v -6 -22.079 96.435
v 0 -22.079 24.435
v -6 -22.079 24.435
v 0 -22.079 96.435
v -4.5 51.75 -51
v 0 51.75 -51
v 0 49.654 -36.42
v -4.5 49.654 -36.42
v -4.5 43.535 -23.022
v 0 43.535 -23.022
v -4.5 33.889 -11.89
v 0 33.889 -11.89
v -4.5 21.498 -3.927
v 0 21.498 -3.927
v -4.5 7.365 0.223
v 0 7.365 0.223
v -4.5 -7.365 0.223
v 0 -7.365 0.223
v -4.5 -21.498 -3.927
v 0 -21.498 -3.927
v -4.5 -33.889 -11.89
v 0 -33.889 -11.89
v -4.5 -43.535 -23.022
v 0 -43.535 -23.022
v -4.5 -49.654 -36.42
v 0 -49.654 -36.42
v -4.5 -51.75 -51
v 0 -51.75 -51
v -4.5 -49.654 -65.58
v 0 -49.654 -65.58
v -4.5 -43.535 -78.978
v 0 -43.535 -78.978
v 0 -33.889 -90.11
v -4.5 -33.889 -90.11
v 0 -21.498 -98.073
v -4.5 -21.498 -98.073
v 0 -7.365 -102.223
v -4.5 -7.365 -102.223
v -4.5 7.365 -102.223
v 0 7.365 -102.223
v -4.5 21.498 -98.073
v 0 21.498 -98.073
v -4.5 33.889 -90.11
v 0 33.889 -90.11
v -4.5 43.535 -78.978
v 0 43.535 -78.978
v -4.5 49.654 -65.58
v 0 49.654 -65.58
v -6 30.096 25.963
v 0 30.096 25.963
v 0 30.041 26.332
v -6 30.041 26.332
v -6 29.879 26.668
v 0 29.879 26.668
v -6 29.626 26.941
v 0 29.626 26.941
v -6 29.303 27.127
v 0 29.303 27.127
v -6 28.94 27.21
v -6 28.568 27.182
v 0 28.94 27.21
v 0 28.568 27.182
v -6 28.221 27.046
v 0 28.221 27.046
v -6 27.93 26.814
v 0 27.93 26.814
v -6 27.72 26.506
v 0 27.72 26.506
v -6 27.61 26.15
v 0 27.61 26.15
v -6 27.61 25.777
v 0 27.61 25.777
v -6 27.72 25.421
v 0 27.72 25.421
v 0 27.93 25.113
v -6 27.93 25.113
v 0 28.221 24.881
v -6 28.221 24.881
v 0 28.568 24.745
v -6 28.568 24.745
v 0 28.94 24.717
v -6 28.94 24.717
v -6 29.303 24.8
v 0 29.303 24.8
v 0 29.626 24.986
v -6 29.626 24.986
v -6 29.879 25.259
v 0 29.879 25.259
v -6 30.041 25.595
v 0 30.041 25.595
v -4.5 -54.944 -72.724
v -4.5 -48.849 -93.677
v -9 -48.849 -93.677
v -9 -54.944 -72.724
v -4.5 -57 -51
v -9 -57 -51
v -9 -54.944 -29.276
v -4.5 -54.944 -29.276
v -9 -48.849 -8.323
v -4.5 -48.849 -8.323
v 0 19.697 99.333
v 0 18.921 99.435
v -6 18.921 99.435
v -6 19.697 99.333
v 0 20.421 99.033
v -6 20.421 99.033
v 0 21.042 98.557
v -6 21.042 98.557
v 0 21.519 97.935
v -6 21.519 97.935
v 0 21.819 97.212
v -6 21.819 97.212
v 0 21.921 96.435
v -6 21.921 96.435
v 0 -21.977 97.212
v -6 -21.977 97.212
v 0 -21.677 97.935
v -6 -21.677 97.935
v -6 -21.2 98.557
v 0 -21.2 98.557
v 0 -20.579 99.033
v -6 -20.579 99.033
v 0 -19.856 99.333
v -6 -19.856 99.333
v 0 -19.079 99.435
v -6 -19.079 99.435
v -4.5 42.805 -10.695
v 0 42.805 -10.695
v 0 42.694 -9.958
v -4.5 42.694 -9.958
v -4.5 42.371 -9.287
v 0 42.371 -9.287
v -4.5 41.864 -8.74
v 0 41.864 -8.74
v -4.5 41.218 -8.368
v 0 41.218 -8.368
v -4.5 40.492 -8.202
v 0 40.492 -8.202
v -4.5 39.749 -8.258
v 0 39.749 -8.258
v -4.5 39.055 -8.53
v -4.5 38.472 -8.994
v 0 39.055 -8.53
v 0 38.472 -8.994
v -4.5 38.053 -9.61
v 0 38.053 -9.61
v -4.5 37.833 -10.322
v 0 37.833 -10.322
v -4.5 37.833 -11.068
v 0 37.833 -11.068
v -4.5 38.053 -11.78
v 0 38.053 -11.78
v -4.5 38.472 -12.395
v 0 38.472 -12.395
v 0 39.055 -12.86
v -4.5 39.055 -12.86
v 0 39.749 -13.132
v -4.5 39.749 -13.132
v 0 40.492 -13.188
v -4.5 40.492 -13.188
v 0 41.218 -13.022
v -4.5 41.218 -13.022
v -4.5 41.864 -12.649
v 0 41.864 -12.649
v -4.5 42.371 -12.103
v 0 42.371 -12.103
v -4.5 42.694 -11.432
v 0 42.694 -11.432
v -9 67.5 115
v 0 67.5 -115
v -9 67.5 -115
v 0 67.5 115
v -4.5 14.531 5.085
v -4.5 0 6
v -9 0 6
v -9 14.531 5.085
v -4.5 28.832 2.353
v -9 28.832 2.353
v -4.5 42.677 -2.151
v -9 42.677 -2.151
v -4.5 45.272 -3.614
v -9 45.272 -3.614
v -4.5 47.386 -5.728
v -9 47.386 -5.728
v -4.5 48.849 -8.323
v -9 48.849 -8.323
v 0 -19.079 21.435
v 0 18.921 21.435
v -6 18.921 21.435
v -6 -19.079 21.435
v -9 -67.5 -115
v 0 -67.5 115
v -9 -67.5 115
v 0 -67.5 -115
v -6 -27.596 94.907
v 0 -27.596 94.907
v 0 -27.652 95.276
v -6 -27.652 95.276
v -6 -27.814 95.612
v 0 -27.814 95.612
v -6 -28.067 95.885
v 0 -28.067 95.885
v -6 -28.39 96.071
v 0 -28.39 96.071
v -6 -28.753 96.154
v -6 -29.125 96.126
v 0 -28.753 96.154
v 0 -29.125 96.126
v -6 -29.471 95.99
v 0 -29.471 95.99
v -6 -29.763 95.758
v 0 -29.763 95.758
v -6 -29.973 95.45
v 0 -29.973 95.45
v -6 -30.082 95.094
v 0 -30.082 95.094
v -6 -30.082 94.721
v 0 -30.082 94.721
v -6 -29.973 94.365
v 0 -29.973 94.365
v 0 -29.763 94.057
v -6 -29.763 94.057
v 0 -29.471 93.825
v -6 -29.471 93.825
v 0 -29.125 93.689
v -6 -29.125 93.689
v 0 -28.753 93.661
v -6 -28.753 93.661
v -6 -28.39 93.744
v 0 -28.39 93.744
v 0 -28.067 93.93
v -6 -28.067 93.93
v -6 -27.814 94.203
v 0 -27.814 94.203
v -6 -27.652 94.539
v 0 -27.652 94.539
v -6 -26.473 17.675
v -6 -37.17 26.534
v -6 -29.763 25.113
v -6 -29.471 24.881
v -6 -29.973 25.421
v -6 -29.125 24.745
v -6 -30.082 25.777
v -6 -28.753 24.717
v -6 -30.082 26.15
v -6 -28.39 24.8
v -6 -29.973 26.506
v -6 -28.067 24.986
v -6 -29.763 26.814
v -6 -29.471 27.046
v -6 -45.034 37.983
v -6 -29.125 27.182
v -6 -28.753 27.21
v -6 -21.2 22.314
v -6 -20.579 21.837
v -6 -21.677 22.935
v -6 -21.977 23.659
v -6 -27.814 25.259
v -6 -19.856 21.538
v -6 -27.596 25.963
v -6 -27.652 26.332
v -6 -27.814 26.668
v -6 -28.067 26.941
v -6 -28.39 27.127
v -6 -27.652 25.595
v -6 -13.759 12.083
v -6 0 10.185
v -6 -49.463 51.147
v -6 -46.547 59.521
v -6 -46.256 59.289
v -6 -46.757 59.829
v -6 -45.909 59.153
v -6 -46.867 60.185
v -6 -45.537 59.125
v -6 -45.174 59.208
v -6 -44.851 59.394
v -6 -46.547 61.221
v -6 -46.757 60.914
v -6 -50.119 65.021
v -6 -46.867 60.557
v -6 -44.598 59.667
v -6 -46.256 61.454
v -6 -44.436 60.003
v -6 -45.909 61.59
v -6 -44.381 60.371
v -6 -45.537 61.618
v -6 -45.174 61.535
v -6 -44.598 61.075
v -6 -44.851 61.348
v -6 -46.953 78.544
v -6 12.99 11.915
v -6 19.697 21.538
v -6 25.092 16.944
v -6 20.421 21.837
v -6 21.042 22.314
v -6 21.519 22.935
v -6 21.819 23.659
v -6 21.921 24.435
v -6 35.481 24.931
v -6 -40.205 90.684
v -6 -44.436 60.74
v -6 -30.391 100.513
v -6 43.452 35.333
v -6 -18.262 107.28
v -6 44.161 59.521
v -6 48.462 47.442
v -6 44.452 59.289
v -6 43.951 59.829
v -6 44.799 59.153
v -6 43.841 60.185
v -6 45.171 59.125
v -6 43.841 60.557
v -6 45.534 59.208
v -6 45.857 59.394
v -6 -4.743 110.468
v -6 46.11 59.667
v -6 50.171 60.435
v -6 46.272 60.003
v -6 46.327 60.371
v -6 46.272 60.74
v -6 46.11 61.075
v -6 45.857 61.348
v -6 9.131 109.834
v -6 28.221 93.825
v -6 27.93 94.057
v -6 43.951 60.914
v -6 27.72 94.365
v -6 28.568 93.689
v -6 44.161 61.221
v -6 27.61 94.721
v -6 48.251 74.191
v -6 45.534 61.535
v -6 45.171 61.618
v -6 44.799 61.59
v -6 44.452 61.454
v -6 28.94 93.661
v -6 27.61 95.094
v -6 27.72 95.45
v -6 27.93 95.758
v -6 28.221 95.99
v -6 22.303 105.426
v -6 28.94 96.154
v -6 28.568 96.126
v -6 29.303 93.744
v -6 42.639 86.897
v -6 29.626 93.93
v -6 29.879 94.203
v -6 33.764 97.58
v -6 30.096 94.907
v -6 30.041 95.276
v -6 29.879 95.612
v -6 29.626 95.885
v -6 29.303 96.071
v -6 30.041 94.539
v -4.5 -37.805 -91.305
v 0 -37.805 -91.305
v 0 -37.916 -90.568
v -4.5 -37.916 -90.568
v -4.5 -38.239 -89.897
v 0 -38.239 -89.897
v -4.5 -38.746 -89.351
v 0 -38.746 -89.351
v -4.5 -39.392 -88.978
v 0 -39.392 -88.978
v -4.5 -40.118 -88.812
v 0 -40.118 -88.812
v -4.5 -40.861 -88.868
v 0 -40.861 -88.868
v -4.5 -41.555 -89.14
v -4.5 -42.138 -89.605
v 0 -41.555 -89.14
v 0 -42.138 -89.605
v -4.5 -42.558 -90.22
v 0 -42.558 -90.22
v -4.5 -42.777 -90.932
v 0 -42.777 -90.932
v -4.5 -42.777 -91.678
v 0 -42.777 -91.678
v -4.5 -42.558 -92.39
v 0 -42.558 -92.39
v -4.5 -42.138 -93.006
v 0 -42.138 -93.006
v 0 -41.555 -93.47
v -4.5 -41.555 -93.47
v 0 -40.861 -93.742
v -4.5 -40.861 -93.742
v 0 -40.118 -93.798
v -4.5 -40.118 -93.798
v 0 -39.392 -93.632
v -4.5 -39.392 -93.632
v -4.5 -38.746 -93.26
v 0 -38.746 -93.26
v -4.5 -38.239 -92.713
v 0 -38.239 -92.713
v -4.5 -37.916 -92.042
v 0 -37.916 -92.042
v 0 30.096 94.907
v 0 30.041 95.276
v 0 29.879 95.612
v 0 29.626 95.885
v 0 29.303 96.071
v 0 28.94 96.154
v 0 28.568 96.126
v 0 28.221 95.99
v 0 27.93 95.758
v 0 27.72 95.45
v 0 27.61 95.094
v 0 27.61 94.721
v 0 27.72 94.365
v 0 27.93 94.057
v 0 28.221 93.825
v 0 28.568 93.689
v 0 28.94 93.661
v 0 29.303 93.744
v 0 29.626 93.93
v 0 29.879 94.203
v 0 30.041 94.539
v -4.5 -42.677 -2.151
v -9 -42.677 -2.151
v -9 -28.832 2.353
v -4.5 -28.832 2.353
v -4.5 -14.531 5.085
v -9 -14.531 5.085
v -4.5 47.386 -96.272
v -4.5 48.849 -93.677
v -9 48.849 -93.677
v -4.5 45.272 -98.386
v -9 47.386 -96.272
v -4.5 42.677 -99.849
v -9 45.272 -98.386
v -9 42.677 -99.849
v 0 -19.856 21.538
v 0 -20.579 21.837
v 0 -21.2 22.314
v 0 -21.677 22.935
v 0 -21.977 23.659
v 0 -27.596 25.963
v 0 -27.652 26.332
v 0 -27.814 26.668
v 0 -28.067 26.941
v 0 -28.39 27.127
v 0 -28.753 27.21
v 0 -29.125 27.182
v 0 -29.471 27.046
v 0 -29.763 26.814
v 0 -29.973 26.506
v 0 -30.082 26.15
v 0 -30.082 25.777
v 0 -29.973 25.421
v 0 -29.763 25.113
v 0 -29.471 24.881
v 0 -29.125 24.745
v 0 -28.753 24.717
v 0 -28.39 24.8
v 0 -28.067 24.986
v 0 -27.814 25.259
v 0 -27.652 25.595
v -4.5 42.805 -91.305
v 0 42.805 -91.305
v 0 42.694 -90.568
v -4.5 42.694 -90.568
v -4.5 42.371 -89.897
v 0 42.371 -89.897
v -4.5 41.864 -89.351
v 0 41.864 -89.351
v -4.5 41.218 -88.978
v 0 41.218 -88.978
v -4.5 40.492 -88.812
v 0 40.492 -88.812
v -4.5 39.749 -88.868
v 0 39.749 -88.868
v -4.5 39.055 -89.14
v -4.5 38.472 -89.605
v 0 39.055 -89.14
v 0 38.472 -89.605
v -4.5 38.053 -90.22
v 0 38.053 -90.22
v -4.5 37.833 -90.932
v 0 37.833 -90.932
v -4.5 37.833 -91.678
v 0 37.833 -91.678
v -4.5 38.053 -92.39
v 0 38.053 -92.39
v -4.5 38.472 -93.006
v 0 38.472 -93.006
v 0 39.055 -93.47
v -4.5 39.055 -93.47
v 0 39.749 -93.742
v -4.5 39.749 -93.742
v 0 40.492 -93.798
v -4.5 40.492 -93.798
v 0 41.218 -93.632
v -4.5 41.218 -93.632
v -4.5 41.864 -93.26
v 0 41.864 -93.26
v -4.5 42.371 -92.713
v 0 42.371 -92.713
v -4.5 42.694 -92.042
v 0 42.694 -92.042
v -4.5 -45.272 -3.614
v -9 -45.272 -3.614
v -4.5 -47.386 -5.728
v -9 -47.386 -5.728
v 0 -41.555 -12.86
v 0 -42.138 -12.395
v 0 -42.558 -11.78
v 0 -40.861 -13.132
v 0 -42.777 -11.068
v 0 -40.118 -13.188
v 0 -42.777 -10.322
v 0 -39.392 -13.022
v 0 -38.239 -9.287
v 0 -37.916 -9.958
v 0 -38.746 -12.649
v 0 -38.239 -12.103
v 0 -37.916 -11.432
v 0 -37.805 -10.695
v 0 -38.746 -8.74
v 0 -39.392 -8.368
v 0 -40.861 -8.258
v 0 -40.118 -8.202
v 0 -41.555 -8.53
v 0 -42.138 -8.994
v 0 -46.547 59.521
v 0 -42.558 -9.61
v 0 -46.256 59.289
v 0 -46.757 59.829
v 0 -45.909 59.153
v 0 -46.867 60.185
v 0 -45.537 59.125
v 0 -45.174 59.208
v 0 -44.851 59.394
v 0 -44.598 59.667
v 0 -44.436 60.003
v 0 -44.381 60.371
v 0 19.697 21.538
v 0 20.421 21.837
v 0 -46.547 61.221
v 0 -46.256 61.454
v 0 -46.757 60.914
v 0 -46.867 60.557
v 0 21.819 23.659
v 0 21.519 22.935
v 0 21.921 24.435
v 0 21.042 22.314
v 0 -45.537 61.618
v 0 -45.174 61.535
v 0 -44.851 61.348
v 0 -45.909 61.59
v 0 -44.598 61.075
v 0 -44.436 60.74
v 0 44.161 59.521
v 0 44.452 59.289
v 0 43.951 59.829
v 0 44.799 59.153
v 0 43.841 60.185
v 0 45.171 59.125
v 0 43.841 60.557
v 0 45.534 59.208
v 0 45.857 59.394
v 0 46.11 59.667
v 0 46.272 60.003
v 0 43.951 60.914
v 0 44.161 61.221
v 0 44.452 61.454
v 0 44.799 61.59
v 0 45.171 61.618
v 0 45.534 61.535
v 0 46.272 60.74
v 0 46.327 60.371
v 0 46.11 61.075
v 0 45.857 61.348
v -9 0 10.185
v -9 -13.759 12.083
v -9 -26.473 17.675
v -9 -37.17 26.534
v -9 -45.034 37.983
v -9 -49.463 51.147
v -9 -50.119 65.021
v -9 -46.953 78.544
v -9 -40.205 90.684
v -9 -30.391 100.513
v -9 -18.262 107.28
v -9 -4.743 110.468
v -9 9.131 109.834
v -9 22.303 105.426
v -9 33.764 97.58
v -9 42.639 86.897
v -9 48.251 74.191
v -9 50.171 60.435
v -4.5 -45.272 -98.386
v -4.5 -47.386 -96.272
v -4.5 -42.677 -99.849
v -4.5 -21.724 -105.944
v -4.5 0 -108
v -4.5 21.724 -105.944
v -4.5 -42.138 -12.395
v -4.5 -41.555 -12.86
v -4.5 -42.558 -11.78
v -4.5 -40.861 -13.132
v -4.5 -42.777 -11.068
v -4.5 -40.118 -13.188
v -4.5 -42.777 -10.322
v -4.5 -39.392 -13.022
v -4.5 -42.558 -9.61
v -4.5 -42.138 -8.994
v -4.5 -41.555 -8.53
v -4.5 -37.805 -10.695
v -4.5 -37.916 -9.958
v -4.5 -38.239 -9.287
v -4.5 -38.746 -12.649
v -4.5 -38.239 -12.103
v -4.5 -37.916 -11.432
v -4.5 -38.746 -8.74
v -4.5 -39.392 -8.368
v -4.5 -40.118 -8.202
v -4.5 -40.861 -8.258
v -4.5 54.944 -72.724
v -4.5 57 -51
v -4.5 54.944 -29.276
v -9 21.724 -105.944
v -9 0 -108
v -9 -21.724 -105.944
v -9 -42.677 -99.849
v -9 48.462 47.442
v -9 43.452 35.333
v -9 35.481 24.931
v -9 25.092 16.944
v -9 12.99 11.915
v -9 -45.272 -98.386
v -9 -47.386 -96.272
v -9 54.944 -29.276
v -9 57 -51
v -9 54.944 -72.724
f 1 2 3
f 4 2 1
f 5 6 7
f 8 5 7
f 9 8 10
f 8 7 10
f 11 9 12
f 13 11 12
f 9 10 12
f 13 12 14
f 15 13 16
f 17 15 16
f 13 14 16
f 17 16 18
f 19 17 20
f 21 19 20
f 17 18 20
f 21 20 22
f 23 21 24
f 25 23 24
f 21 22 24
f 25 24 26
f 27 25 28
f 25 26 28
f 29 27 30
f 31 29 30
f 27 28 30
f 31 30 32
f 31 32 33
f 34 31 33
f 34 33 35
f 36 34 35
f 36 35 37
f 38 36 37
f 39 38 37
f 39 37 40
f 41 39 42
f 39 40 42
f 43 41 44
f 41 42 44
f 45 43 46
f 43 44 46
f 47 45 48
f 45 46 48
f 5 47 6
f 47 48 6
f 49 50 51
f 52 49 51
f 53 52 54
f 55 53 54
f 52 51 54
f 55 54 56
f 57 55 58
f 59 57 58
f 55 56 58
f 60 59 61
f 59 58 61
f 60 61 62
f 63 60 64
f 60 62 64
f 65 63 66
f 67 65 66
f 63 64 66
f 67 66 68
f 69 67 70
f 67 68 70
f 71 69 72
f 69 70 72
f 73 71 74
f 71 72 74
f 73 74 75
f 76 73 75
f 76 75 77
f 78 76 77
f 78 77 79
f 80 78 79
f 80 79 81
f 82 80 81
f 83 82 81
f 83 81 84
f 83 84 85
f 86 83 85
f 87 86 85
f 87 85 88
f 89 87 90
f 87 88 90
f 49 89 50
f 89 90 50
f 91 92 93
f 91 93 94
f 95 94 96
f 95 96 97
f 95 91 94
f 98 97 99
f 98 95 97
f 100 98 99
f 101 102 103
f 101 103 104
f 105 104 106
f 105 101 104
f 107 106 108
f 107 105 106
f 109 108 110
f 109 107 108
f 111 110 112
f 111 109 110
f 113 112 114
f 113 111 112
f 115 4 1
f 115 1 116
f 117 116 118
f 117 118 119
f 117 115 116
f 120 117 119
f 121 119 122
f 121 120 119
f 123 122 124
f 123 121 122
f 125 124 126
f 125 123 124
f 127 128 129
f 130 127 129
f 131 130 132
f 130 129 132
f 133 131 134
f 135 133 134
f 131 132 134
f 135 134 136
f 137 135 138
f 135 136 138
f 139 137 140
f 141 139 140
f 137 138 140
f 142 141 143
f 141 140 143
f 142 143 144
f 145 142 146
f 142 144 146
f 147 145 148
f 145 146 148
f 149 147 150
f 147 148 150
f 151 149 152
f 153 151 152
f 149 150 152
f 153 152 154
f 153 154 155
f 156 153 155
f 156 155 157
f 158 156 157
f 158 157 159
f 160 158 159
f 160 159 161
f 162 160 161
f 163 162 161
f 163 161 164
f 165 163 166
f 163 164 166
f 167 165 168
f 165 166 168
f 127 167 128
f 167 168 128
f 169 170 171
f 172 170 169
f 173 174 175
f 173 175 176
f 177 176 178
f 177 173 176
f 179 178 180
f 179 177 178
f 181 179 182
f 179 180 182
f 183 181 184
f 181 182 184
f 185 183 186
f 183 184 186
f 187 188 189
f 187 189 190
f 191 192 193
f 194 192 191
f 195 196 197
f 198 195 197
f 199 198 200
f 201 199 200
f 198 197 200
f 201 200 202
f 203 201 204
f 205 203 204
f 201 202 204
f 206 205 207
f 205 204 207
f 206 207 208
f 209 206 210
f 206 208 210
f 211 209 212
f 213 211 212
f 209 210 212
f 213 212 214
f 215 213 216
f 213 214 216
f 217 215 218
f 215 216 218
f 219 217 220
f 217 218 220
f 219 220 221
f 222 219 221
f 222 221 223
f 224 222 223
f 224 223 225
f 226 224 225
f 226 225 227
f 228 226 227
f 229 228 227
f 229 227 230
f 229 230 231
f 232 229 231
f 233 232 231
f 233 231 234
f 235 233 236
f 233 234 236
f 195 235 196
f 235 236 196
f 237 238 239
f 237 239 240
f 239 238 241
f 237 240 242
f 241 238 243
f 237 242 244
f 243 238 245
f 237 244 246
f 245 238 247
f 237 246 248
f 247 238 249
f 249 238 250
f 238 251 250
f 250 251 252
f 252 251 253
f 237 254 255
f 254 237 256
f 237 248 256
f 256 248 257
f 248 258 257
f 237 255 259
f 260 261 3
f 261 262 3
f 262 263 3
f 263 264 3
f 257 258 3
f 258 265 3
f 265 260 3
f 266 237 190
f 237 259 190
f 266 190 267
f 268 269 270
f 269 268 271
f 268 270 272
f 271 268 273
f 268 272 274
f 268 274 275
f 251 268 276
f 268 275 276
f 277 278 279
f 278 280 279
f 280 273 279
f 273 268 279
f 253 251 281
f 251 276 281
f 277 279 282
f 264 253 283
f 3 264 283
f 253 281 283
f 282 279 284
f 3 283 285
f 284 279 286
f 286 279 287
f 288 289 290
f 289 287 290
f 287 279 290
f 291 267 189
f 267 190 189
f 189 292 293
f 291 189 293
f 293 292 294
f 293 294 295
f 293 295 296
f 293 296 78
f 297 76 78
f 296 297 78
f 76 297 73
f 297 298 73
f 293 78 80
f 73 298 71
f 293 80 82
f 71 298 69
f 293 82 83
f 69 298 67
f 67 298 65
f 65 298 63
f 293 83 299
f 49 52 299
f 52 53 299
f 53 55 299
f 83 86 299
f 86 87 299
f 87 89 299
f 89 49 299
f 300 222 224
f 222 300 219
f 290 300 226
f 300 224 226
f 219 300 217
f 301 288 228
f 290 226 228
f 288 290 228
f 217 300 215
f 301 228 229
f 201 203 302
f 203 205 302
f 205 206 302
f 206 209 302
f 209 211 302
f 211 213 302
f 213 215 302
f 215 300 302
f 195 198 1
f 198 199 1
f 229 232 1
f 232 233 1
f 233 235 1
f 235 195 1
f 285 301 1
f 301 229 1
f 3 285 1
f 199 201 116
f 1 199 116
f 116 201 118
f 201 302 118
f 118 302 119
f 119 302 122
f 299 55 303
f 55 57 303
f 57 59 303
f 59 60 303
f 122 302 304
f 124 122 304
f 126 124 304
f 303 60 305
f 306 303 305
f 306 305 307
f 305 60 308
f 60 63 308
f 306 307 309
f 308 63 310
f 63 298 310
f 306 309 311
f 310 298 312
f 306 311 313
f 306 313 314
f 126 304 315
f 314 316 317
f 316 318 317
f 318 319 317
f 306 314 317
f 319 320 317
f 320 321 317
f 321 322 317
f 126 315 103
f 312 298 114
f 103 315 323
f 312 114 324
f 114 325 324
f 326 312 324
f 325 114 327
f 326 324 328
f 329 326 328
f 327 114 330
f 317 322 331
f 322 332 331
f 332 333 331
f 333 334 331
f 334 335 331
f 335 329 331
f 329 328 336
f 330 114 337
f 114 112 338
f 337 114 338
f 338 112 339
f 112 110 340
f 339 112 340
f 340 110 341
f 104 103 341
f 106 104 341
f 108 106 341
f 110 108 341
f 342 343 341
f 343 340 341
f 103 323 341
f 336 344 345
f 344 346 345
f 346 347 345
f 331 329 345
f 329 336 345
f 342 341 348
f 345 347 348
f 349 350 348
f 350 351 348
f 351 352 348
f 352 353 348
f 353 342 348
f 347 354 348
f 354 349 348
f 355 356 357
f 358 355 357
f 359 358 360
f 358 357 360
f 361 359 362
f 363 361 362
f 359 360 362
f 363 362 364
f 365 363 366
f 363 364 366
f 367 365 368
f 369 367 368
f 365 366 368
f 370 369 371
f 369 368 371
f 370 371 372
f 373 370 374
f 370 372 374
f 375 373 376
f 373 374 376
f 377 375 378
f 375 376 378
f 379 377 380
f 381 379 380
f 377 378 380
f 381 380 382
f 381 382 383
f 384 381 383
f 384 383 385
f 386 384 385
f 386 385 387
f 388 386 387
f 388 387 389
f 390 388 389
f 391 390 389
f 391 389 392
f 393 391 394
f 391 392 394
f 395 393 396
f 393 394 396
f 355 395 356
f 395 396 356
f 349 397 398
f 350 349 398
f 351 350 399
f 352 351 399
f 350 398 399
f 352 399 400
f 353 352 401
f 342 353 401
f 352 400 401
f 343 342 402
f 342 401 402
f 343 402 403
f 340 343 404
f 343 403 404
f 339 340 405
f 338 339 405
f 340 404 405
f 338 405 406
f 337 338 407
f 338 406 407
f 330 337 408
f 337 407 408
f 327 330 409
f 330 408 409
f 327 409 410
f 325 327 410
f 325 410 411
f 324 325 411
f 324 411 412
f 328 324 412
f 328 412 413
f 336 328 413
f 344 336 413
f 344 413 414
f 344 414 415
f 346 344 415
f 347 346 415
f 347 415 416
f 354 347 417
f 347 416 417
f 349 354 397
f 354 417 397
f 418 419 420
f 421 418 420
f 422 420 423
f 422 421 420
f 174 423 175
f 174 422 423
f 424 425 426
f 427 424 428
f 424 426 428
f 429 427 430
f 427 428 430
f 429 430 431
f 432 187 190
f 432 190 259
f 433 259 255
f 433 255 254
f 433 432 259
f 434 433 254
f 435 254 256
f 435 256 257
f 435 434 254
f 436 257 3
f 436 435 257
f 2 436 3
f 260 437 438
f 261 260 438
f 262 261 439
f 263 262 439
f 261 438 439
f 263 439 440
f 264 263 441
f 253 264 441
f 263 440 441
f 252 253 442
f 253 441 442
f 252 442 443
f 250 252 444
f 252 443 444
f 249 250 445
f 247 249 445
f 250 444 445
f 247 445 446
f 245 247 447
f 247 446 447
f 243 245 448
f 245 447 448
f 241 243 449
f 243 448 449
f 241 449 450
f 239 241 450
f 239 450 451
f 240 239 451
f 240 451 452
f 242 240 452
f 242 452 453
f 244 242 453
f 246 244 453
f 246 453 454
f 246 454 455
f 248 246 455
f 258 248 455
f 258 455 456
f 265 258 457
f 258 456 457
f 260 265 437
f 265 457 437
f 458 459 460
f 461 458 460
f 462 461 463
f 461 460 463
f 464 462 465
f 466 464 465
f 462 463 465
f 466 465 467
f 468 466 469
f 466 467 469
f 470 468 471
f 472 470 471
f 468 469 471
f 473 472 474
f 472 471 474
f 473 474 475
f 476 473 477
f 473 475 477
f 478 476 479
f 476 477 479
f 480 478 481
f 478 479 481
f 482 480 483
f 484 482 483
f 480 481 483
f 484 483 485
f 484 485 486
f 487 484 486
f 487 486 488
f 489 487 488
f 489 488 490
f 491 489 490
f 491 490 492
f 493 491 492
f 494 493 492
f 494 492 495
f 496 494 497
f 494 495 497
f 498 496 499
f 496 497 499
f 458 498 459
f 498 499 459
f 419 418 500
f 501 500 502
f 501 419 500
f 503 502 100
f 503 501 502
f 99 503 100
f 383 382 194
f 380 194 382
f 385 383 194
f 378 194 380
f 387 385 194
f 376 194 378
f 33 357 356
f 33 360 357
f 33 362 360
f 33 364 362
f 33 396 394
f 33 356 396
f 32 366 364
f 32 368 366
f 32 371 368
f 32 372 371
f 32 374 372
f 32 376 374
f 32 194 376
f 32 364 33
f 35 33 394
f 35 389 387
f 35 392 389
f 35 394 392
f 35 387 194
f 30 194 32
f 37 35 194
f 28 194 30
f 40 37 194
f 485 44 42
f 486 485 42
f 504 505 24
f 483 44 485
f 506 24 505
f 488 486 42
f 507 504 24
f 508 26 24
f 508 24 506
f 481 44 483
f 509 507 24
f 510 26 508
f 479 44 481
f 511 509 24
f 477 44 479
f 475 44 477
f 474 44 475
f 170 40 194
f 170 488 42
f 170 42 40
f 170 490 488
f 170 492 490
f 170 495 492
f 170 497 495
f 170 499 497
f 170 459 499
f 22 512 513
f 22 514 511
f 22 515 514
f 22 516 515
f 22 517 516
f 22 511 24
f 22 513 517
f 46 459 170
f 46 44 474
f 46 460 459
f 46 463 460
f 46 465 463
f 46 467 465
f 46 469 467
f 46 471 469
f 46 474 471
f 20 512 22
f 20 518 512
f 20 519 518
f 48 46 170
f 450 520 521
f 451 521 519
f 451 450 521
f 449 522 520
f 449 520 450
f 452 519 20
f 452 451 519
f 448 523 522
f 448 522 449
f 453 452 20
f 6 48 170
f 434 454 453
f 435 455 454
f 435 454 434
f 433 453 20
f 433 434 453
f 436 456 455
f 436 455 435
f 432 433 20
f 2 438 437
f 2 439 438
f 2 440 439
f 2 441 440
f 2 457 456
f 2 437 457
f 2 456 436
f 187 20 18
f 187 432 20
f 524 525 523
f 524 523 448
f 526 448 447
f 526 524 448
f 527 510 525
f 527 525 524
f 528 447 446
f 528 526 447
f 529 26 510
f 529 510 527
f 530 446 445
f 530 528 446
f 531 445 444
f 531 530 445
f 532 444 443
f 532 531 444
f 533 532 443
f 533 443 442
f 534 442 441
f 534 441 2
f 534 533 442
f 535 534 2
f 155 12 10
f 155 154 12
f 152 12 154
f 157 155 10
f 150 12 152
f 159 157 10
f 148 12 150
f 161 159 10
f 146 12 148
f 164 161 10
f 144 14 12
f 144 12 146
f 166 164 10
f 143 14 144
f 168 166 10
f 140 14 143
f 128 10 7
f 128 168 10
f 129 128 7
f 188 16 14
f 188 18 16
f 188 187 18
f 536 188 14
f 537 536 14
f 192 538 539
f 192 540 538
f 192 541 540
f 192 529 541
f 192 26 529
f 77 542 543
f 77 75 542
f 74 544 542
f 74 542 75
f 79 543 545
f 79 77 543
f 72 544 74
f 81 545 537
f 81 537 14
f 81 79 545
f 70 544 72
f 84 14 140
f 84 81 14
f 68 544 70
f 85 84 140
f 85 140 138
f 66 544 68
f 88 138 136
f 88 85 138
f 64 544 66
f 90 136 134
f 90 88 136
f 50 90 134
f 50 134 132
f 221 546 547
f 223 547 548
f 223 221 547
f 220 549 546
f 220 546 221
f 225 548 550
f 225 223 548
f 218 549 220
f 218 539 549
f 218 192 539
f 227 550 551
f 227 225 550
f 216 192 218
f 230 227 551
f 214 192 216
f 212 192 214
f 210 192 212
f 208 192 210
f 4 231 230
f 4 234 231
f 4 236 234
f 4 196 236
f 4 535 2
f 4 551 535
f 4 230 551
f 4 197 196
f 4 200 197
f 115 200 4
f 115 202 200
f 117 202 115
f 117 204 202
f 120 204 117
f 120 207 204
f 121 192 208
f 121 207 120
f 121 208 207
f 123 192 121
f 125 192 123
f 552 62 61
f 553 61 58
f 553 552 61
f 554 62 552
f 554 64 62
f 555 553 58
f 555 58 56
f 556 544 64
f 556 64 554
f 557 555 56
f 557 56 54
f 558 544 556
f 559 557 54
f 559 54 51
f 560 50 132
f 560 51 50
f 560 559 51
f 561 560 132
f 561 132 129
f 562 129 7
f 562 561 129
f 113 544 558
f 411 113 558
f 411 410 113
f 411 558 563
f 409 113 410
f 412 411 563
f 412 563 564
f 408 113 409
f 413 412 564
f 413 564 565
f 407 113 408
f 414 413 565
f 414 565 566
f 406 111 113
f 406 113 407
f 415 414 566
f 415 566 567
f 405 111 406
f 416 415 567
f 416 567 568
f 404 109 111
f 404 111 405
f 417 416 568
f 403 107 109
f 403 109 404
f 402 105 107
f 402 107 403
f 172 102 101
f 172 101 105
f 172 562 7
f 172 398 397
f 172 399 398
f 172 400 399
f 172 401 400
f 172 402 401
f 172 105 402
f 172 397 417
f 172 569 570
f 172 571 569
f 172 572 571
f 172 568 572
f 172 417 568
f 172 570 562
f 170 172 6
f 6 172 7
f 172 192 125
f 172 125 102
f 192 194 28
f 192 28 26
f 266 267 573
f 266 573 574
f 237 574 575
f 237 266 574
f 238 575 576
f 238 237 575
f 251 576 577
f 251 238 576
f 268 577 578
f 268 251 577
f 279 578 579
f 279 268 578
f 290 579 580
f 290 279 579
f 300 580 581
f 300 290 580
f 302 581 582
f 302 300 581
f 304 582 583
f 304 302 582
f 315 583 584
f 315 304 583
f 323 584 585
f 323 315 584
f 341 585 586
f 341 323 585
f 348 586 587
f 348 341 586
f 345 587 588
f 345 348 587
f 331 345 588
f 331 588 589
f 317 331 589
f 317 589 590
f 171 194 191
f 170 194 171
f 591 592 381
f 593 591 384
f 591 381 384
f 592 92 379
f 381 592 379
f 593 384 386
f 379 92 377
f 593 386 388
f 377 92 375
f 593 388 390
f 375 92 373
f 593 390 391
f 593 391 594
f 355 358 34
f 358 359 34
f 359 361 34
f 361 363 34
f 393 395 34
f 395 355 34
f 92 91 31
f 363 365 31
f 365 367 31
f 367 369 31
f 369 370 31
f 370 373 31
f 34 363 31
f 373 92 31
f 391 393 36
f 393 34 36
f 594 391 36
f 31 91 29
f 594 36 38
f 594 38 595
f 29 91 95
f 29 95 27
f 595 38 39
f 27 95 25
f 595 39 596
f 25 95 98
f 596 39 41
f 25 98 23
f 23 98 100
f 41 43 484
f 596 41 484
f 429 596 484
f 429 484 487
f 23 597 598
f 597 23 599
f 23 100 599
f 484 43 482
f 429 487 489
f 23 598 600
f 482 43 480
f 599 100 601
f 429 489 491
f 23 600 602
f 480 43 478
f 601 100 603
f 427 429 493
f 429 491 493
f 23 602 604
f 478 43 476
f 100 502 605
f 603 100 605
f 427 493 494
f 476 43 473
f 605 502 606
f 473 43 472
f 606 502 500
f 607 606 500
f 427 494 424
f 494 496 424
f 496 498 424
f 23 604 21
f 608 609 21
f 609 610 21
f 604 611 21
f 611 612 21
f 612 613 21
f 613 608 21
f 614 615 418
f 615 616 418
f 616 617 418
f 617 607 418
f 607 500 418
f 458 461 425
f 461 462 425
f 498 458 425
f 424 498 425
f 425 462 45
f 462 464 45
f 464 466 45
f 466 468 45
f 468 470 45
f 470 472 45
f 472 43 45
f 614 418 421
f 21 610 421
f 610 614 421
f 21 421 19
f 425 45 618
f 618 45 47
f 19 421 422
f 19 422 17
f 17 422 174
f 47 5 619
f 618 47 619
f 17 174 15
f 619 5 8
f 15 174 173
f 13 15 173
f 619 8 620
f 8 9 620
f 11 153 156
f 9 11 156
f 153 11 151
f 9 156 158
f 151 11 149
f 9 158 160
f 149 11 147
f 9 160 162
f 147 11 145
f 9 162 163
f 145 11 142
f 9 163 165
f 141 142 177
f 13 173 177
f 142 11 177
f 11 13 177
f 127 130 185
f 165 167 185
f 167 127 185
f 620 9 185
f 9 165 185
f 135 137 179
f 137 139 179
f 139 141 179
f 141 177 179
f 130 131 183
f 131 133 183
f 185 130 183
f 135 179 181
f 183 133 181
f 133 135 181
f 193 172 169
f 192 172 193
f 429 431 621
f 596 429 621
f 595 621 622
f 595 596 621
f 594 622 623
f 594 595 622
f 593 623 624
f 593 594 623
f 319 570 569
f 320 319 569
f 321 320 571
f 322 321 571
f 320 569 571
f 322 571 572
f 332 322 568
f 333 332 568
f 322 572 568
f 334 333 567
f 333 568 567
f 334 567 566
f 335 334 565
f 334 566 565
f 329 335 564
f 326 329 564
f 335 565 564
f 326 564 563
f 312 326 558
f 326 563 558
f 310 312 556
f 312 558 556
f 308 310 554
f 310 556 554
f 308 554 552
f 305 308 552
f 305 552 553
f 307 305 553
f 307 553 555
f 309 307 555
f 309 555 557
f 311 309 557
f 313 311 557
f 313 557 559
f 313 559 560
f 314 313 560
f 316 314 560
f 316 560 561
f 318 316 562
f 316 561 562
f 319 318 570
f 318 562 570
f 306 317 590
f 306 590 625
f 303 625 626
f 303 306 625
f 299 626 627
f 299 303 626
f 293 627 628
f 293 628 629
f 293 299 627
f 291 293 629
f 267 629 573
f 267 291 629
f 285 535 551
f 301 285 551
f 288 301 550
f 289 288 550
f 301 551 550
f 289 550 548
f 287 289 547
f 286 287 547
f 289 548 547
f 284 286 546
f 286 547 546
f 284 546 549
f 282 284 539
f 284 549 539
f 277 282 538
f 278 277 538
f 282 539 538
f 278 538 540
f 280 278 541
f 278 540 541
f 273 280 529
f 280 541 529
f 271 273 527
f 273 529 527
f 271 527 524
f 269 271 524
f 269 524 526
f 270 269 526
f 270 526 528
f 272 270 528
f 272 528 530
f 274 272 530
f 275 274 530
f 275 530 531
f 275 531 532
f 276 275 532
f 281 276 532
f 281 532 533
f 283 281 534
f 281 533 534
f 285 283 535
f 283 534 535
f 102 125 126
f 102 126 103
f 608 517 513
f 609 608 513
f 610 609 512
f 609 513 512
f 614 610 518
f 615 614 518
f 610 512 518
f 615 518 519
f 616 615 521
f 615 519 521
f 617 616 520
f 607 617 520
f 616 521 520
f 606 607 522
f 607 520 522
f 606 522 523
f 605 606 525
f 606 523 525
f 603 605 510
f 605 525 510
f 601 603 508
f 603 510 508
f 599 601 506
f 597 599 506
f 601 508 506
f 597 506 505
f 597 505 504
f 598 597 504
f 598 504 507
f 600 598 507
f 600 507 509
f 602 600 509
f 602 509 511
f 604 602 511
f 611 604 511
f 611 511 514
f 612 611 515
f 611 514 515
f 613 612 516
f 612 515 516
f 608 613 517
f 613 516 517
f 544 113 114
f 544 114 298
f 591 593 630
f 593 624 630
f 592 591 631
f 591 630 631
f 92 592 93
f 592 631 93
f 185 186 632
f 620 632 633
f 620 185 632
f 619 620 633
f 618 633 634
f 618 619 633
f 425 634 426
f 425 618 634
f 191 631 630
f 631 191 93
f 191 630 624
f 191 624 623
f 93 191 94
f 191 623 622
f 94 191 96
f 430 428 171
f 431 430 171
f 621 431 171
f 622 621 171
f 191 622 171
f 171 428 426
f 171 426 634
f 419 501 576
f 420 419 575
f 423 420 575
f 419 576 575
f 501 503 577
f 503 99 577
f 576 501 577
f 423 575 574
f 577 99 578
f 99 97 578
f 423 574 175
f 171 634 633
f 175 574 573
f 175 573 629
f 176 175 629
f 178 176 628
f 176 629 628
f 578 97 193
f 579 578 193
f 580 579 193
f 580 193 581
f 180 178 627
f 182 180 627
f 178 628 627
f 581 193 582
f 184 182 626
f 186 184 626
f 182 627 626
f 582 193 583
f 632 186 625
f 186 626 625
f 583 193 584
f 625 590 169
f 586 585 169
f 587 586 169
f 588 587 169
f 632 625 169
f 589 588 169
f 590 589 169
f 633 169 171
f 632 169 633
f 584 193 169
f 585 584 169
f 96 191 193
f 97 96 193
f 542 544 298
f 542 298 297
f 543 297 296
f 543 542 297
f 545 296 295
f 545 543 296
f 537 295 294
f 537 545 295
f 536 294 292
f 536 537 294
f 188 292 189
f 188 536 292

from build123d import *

# Parameters (mm, degrees)
F1_DEPTH = 9
F0_R     = 2.5
F0_R_2   = 51.75
F2_DEPTH = 4.5
F3_R     = 11
F0_R_3   = 1.25
F4_DEPTH = 6


with BuildPart() as f1:
    # F0 (on Right) → F1 (new body)
    with BuildSketch(Plane.YZ):
        Polygon((67.5, -115), (67.5, 115), (0, 115), (-67.5, 115), (-67.5, -115), align=None)
        with BuildLine():
            ThreePointArc((-47.0226009489, -3.9773990511), (-24.0347326375, 3.4781900517), (0, 6))
            ThreePointArc((0, 6), (24.0347326375, 3.4781900517), (47.0226009489, -3.9773990511))
            ThreePointArc((47.0226009489, -3.9773990511), (57, -51), (47.0226009489, -98.0226009489))
            ThreePointArc((47.0226009489, -98.0226009489), (0, -108), (-47.0226009489, -98.0226009489))
            ThreePointArc((-47.0226009489, -98.0226009489), (-57, -51), (-47.0226009489, -3.9773990511))
        make_face(mode=Mode.SUBTRACT)
        with BuildLine():
            ThreePointArc((0, 10.1854634317), (-50.3290897047, 60.4354011911), (0, 110.6853389504))
            ThreePointArc((0, 110.6853389504), (35.4809774891, 95.9395435011), (50.1709102953, 60.4354011911))
            ThreePointArc((50.1709102953, 60.4354011911), (35.4809774891, 24.9312588811), (0, 10.1854634317))
        make_face(mode=Mode.SUBTRACT)
    extrude(amount=-F1_DEPTH)

    # F0 (on Right) → F2 (join)
    with BuildSketch(Plane.YZ):
        with BuildLine():
            ThreePointArc((47.0226009489, -3.9773990511), (24.0347326375, 3.4781900517), (0, 6))
            ThreePointArc((0, 6), (-24.0347326375, 3.4781900517), (-47.0226009489, -3.9773990511))
            ThreePointArc((-47.0226009489, -3.9773990511), (-57, -51), (-47.0226009489, -98.0226009489))
            ThreePointArc((-47.0226009489, -98.0226009489), (0, -108), (47.0226009489, -98.0226009489))
            ThreePointArc((47.0226009489, -98.0226009489), (57, -51), (47.0226009489, -3.9773990511))
        make_face()
        with Locations((-40.3050865276, -91.3050865276)):
            Circle(F0_R, mode=Mode.SUBTRACT)
        with Locations((-40.3050865276, -10.6949134724)):
            Circle(F0_R, mode=Mode.SUBTRACT)
        with Locations((40.3050865276, -91.3050865276)):
            Circle(F0_R, mode=Mode.SUBTRACT)
        with Locations((0, -51)):
            Circle(F0_R_2, mode=Mode.SUBTRACT)
        with Locations((40.3050865276, -10.6949134724)):
            Circle(F0_R, mode=Mode.SUBTRACT)
    extrude(amount=-F2_DEPTH)

    # F3
    f3_edges = [f1.edges().sort_by_distance(p)[0] for p in [
        (-6.75, 47.022601, -3.977399),
        (-6.75, -47.022601, -3.977399),
        (-6.75, -47.022601, -98.022601),
        (-6.75, 47.022601, -98.022601),
    ]]
    fillet(f3_edges, radius=F3_R)

    # F0 (on Right) → F4 (join)
    with BuildSketch(Plane.YZ):
        with BuildLine():
            ThreePointArc((50.1709102953, 60.4354011911), (35.4809774891, 95.9395435011), (0, 110.6853389504))
            Line((0, 110.6853389504), (0, 99.4354011911))
            Line((0, 99.4354011911), (18.9209102953, 99.4354011911))
            ThreePointArc((18.9209102953, 99.4354011911), (21.0422306388, 98.5567215346), (21.9209102953, 96.4354011911))
            Line((21.9209102953, 96.4354011911), (21.9209102953, 24.4354011911))
            ThreePointArc((21.9209102953, 24.4354011911), (21.0422306388, 22.3140808475), (18.9209102953, 21.4354011911))
            Line((18.9209102953, 21.4354011911), (0, 21.4354011911))
            Line((0, 21.4354011911), (0, 10.1854634317))
            ThreePointArc((0, 10.1854634317), (35.4809774891, 24.9312588811), (50.1709102953, 60.4354011911))
        make_face()
        with Locations((28.8463527312, 25.9634012507)):
            Circle(F0_R_3, mode=Mode.SUBTRACT)
        with Locations((28.8463527312, 94.9074011314)):
            Circle(F0_R_3, mode=Mode.SUBTRACT)
        with Locations((45.0773127377, 60.3711940348)):
            Circle(F0_R_3, mode=Mode.SUBTRACT)
        with BuildLine():
            Line((0, 99.4354011911), (0, 110.6853389504))
            ThreePointArc((0, 110.6853389504), (-50.3290897047, 60.4354011911), (0, 10.1854634317))
            Line((0, 10.1854634317), (0, 21.4354011911))
            Line((0, 21.4354011911), (-19.0790897047, 21.4354011911))
            ThreePointArc((-19.0790897047, 21.4354011911), (-21.2004100483, 22.3140808475), (-22.0790897047, 24.4354011911))
            Line((-22.0790897047, 24.4354011911), (-22.0790897047, 96.4354011911))
            ThreePointArc((-22.0790897047, 96.4354011911), (-21.2004100483, 98.5567215346), (-19.0790897047, 99.4354011911))
            Line((-19.0790897047, 99.4354011911), (0, 99.4354011911))
        make_face()
        with Locations((-28.8463527312, 25.9634012507)):
            Circle(F0_R_3, mode=Mode.SUBTRACT)
        with Locations((-45.6305965781, 60.3711940348)):
            Circle(F0_R_3, mode=Mode.SUBTRACT)
        with Locations((-28.8463527312, 94.9074011314)):
            Circle(F0_R_3, mode=Mode.SUBTRACT)
    extrude(amount=-F4_DEPTH)


solid = f1.part
